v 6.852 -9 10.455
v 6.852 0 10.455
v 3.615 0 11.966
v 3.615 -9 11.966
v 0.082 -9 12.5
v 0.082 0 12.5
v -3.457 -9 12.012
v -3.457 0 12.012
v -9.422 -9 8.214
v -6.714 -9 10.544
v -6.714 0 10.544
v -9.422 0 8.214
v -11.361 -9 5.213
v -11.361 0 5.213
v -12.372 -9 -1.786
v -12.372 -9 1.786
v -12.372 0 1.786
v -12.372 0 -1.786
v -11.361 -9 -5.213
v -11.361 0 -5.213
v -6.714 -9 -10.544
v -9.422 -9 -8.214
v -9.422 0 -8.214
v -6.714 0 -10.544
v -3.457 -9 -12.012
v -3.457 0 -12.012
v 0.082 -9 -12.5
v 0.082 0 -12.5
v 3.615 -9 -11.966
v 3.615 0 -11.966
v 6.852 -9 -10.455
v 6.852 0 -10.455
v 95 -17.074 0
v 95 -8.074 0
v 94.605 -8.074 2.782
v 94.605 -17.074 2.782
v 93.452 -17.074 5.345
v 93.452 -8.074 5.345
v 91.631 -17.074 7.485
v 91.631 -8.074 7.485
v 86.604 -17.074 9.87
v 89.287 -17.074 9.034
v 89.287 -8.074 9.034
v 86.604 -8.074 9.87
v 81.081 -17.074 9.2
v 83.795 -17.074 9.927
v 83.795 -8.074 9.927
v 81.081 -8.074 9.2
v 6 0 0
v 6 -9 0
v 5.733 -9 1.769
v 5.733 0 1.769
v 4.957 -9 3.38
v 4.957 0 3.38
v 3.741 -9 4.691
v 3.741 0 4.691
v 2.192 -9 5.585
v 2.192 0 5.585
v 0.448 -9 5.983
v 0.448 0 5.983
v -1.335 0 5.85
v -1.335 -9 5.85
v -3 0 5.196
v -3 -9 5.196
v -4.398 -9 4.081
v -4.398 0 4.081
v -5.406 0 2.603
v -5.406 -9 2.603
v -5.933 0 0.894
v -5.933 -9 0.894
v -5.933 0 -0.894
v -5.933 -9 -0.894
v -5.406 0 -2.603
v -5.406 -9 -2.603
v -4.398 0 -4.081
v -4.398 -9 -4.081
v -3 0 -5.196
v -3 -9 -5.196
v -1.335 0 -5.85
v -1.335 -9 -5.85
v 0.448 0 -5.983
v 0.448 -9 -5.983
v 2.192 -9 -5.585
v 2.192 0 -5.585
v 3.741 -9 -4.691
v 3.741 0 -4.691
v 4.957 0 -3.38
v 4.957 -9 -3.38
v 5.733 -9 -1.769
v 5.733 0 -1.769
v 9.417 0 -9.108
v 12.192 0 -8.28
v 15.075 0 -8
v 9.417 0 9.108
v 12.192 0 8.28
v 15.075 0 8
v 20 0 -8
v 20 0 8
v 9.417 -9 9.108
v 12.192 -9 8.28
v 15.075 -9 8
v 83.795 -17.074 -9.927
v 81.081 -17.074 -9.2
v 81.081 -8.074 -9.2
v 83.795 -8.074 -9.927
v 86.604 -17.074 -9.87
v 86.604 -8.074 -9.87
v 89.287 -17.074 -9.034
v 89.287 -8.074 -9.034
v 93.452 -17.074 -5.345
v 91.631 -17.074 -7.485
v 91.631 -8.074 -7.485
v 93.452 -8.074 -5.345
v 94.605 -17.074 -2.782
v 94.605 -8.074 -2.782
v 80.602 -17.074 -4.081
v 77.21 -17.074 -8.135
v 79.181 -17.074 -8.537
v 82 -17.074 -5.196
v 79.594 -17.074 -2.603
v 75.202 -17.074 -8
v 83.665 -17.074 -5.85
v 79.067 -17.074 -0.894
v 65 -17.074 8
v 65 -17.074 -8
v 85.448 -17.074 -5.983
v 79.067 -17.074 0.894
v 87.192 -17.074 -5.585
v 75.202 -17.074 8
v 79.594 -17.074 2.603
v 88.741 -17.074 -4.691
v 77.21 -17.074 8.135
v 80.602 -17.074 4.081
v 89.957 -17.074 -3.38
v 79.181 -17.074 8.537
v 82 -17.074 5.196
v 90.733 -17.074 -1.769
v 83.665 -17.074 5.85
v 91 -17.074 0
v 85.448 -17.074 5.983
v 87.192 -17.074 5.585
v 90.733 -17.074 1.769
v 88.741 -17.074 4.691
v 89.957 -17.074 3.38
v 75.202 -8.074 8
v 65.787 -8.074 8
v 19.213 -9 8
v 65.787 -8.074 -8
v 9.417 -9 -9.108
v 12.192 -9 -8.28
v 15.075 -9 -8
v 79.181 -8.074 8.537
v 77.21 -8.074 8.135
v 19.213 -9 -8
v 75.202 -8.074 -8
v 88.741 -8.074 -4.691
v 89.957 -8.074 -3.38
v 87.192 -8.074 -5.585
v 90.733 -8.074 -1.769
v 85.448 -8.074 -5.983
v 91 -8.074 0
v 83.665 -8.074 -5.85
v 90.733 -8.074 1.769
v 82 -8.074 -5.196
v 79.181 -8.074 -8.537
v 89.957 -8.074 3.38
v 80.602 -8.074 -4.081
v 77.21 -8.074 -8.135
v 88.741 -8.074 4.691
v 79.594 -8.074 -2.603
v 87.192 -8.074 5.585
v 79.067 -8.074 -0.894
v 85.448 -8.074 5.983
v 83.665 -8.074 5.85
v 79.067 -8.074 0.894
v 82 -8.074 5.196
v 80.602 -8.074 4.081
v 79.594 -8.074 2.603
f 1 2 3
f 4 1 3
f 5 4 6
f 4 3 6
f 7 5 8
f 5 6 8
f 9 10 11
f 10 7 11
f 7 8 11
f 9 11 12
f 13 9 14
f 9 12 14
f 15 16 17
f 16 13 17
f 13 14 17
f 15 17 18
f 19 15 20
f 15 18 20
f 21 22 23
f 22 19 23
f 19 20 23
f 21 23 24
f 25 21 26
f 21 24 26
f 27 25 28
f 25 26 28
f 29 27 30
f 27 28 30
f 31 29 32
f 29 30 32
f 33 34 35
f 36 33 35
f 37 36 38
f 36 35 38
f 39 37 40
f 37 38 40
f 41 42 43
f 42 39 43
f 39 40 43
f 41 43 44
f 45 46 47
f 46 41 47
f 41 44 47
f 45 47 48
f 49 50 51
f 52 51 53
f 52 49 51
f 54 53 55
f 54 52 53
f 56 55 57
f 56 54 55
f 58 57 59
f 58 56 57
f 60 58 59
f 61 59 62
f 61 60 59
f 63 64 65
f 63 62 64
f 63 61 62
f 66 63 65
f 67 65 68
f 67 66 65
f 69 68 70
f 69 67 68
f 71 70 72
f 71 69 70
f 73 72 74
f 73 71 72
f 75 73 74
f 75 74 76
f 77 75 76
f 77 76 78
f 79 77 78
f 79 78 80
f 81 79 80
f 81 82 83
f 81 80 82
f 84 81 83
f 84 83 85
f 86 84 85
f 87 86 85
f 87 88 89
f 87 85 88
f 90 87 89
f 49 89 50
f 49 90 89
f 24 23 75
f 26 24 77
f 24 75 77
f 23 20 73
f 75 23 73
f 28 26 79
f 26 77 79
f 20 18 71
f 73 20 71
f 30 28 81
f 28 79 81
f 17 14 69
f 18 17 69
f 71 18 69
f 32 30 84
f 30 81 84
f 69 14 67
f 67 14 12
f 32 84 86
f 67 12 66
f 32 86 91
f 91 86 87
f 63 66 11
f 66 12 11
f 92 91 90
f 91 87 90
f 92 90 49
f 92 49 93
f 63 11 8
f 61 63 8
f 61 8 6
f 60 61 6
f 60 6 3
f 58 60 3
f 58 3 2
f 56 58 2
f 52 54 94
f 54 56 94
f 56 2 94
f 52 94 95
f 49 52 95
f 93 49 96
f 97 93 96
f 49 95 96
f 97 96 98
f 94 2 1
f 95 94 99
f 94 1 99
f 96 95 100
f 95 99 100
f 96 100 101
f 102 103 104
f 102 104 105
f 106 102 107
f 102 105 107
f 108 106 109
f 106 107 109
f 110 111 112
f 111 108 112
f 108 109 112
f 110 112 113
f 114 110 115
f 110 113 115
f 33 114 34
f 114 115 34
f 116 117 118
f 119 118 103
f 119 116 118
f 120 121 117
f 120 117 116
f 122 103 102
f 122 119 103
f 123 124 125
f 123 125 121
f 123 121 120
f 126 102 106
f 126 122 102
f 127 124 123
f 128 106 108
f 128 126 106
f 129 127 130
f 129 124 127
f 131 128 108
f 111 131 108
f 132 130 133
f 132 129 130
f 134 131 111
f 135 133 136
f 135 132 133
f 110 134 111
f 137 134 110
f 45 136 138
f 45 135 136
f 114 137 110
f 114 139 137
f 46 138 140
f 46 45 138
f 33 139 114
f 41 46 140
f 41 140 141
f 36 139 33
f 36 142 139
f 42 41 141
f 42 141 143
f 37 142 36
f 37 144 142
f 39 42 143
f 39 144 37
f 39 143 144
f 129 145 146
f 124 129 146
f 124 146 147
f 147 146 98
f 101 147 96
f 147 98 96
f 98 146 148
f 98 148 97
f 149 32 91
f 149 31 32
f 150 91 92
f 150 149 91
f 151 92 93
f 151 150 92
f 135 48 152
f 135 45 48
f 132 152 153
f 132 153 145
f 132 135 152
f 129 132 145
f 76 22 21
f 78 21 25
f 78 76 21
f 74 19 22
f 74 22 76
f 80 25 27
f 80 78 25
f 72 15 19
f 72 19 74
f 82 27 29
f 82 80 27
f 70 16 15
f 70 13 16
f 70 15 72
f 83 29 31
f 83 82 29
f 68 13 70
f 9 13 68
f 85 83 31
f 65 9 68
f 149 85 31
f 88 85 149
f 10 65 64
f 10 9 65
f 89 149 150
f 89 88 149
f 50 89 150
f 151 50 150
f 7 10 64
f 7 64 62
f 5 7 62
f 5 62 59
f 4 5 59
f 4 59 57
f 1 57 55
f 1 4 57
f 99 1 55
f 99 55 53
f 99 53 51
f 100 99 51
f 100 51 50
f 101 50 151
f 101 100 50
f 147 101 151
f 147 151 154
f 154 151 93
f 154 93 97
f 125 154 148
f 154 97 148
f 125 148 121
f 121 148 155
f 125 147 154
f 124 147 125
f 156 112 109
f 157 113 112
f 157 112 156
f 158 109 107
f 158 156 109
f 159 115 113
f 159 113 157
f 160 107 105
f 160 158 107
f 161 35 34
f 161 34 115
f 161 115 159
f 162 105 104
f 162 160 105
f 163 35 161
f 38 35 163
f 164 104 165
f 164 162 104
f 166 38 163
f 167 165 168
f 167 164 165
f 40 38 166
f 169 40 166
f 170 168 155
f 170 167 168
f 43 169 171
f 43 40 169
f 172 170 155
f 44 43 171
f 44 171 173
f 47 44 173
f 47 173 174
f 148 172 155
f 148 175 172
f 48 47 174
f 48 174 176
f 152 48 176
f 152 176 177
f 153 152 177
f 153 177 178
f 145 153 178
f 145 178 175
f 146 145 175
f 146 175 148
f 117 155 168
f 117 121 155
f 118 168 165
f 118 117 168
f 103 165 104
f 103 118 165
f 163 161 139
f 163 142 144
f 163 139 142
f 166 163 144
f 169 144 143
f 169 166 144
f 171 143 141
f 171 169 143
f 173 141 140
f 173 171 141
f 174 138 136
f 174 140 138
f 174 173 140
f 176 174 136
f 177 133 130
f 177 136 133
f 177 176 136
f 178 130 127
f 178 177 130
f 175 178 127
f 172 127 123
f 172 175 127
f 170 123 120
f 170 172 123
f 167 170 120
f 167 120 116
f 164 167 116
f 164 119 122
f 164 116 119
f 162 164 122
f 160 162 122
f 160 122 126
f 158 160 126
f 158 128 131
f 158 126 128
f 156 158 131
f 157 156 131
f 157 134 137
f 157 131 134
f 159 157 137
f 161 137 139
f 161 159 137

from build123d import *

# Parameters (mm, degrees)
F0_R     = 6
F1_DEPTH = 25
F3_DEPTH = 12.5
F4_R     = 15


with BuildPart() as f1:
    # F0 (on Front) → F1 (new body)
    with BuildSketch(Plane.XZ):
        with BuildLine():
            ThreePointArc((9.604686, -8), (11.753905, -4.253905), (12.5, 0))
            ThreePointArc((12.5, 0), (11.753905, 4.253905), (9.604686, 8))
            ThreePointArc((9.604686, 8), (-12.5, 0), (9.604686, -8))
        make_face()
        Circle(F0_R, mode=Mode.SUBTRACT)
        with BuildLine():
            ThreePointArc((9.604686, 8), (11.753905, 4.253905), (12.5, 0))
            ThreePointArc((12.5, 0), (11.753905, -4.253905), (9.604686, -8))
            Line((9.604686, -8), (79, -8))
            ThreePointArc((79, -8), (75, 0), (79, 8))
            Line((79, 8), (9.604686, 8))
        make_face()
        with BuildLine():
            ThreePointArc((95, 0), (89.472136, 8.944272), (79, 8))
            ThreePointArc((79, 8), (75, 0), (79, -8))
            ThreePointArc((79, -8), (89.472136, -8.944272), (95, 0))
        make_face()
        with Locations((85, 0)):
            Circle(F0_R, mode=Mode.SUBTRACT)
    extrude(amount=F1_DEPTH)

    # F2 (on Top) → F3 (intersect, symmetric)
    with BuildSketch(Plane.XY):
        Polygon((95, -17.073554), (95, -8.073554), (65.787398, -8.073554), (20, 0), (-12.5, 0), (-12.5, -9), (19.212602, -9), (65, -17.073554), align=None)
    extrude(amount=F3_DEPTH, both=True, mode=Mode.INTERSECT)

    # F4
    f4_edges = [f1.edges().sort_by_distance(p)[0] for p in [
        (79, -12.573554, -8),
        (9.604686, -4.5, -8),
        (9.604686, -4.5, 8),
        (79, -12.573554, 8),
    ]]
    fillet(f4_edges, radius=F4_R)


solid = f1.part
